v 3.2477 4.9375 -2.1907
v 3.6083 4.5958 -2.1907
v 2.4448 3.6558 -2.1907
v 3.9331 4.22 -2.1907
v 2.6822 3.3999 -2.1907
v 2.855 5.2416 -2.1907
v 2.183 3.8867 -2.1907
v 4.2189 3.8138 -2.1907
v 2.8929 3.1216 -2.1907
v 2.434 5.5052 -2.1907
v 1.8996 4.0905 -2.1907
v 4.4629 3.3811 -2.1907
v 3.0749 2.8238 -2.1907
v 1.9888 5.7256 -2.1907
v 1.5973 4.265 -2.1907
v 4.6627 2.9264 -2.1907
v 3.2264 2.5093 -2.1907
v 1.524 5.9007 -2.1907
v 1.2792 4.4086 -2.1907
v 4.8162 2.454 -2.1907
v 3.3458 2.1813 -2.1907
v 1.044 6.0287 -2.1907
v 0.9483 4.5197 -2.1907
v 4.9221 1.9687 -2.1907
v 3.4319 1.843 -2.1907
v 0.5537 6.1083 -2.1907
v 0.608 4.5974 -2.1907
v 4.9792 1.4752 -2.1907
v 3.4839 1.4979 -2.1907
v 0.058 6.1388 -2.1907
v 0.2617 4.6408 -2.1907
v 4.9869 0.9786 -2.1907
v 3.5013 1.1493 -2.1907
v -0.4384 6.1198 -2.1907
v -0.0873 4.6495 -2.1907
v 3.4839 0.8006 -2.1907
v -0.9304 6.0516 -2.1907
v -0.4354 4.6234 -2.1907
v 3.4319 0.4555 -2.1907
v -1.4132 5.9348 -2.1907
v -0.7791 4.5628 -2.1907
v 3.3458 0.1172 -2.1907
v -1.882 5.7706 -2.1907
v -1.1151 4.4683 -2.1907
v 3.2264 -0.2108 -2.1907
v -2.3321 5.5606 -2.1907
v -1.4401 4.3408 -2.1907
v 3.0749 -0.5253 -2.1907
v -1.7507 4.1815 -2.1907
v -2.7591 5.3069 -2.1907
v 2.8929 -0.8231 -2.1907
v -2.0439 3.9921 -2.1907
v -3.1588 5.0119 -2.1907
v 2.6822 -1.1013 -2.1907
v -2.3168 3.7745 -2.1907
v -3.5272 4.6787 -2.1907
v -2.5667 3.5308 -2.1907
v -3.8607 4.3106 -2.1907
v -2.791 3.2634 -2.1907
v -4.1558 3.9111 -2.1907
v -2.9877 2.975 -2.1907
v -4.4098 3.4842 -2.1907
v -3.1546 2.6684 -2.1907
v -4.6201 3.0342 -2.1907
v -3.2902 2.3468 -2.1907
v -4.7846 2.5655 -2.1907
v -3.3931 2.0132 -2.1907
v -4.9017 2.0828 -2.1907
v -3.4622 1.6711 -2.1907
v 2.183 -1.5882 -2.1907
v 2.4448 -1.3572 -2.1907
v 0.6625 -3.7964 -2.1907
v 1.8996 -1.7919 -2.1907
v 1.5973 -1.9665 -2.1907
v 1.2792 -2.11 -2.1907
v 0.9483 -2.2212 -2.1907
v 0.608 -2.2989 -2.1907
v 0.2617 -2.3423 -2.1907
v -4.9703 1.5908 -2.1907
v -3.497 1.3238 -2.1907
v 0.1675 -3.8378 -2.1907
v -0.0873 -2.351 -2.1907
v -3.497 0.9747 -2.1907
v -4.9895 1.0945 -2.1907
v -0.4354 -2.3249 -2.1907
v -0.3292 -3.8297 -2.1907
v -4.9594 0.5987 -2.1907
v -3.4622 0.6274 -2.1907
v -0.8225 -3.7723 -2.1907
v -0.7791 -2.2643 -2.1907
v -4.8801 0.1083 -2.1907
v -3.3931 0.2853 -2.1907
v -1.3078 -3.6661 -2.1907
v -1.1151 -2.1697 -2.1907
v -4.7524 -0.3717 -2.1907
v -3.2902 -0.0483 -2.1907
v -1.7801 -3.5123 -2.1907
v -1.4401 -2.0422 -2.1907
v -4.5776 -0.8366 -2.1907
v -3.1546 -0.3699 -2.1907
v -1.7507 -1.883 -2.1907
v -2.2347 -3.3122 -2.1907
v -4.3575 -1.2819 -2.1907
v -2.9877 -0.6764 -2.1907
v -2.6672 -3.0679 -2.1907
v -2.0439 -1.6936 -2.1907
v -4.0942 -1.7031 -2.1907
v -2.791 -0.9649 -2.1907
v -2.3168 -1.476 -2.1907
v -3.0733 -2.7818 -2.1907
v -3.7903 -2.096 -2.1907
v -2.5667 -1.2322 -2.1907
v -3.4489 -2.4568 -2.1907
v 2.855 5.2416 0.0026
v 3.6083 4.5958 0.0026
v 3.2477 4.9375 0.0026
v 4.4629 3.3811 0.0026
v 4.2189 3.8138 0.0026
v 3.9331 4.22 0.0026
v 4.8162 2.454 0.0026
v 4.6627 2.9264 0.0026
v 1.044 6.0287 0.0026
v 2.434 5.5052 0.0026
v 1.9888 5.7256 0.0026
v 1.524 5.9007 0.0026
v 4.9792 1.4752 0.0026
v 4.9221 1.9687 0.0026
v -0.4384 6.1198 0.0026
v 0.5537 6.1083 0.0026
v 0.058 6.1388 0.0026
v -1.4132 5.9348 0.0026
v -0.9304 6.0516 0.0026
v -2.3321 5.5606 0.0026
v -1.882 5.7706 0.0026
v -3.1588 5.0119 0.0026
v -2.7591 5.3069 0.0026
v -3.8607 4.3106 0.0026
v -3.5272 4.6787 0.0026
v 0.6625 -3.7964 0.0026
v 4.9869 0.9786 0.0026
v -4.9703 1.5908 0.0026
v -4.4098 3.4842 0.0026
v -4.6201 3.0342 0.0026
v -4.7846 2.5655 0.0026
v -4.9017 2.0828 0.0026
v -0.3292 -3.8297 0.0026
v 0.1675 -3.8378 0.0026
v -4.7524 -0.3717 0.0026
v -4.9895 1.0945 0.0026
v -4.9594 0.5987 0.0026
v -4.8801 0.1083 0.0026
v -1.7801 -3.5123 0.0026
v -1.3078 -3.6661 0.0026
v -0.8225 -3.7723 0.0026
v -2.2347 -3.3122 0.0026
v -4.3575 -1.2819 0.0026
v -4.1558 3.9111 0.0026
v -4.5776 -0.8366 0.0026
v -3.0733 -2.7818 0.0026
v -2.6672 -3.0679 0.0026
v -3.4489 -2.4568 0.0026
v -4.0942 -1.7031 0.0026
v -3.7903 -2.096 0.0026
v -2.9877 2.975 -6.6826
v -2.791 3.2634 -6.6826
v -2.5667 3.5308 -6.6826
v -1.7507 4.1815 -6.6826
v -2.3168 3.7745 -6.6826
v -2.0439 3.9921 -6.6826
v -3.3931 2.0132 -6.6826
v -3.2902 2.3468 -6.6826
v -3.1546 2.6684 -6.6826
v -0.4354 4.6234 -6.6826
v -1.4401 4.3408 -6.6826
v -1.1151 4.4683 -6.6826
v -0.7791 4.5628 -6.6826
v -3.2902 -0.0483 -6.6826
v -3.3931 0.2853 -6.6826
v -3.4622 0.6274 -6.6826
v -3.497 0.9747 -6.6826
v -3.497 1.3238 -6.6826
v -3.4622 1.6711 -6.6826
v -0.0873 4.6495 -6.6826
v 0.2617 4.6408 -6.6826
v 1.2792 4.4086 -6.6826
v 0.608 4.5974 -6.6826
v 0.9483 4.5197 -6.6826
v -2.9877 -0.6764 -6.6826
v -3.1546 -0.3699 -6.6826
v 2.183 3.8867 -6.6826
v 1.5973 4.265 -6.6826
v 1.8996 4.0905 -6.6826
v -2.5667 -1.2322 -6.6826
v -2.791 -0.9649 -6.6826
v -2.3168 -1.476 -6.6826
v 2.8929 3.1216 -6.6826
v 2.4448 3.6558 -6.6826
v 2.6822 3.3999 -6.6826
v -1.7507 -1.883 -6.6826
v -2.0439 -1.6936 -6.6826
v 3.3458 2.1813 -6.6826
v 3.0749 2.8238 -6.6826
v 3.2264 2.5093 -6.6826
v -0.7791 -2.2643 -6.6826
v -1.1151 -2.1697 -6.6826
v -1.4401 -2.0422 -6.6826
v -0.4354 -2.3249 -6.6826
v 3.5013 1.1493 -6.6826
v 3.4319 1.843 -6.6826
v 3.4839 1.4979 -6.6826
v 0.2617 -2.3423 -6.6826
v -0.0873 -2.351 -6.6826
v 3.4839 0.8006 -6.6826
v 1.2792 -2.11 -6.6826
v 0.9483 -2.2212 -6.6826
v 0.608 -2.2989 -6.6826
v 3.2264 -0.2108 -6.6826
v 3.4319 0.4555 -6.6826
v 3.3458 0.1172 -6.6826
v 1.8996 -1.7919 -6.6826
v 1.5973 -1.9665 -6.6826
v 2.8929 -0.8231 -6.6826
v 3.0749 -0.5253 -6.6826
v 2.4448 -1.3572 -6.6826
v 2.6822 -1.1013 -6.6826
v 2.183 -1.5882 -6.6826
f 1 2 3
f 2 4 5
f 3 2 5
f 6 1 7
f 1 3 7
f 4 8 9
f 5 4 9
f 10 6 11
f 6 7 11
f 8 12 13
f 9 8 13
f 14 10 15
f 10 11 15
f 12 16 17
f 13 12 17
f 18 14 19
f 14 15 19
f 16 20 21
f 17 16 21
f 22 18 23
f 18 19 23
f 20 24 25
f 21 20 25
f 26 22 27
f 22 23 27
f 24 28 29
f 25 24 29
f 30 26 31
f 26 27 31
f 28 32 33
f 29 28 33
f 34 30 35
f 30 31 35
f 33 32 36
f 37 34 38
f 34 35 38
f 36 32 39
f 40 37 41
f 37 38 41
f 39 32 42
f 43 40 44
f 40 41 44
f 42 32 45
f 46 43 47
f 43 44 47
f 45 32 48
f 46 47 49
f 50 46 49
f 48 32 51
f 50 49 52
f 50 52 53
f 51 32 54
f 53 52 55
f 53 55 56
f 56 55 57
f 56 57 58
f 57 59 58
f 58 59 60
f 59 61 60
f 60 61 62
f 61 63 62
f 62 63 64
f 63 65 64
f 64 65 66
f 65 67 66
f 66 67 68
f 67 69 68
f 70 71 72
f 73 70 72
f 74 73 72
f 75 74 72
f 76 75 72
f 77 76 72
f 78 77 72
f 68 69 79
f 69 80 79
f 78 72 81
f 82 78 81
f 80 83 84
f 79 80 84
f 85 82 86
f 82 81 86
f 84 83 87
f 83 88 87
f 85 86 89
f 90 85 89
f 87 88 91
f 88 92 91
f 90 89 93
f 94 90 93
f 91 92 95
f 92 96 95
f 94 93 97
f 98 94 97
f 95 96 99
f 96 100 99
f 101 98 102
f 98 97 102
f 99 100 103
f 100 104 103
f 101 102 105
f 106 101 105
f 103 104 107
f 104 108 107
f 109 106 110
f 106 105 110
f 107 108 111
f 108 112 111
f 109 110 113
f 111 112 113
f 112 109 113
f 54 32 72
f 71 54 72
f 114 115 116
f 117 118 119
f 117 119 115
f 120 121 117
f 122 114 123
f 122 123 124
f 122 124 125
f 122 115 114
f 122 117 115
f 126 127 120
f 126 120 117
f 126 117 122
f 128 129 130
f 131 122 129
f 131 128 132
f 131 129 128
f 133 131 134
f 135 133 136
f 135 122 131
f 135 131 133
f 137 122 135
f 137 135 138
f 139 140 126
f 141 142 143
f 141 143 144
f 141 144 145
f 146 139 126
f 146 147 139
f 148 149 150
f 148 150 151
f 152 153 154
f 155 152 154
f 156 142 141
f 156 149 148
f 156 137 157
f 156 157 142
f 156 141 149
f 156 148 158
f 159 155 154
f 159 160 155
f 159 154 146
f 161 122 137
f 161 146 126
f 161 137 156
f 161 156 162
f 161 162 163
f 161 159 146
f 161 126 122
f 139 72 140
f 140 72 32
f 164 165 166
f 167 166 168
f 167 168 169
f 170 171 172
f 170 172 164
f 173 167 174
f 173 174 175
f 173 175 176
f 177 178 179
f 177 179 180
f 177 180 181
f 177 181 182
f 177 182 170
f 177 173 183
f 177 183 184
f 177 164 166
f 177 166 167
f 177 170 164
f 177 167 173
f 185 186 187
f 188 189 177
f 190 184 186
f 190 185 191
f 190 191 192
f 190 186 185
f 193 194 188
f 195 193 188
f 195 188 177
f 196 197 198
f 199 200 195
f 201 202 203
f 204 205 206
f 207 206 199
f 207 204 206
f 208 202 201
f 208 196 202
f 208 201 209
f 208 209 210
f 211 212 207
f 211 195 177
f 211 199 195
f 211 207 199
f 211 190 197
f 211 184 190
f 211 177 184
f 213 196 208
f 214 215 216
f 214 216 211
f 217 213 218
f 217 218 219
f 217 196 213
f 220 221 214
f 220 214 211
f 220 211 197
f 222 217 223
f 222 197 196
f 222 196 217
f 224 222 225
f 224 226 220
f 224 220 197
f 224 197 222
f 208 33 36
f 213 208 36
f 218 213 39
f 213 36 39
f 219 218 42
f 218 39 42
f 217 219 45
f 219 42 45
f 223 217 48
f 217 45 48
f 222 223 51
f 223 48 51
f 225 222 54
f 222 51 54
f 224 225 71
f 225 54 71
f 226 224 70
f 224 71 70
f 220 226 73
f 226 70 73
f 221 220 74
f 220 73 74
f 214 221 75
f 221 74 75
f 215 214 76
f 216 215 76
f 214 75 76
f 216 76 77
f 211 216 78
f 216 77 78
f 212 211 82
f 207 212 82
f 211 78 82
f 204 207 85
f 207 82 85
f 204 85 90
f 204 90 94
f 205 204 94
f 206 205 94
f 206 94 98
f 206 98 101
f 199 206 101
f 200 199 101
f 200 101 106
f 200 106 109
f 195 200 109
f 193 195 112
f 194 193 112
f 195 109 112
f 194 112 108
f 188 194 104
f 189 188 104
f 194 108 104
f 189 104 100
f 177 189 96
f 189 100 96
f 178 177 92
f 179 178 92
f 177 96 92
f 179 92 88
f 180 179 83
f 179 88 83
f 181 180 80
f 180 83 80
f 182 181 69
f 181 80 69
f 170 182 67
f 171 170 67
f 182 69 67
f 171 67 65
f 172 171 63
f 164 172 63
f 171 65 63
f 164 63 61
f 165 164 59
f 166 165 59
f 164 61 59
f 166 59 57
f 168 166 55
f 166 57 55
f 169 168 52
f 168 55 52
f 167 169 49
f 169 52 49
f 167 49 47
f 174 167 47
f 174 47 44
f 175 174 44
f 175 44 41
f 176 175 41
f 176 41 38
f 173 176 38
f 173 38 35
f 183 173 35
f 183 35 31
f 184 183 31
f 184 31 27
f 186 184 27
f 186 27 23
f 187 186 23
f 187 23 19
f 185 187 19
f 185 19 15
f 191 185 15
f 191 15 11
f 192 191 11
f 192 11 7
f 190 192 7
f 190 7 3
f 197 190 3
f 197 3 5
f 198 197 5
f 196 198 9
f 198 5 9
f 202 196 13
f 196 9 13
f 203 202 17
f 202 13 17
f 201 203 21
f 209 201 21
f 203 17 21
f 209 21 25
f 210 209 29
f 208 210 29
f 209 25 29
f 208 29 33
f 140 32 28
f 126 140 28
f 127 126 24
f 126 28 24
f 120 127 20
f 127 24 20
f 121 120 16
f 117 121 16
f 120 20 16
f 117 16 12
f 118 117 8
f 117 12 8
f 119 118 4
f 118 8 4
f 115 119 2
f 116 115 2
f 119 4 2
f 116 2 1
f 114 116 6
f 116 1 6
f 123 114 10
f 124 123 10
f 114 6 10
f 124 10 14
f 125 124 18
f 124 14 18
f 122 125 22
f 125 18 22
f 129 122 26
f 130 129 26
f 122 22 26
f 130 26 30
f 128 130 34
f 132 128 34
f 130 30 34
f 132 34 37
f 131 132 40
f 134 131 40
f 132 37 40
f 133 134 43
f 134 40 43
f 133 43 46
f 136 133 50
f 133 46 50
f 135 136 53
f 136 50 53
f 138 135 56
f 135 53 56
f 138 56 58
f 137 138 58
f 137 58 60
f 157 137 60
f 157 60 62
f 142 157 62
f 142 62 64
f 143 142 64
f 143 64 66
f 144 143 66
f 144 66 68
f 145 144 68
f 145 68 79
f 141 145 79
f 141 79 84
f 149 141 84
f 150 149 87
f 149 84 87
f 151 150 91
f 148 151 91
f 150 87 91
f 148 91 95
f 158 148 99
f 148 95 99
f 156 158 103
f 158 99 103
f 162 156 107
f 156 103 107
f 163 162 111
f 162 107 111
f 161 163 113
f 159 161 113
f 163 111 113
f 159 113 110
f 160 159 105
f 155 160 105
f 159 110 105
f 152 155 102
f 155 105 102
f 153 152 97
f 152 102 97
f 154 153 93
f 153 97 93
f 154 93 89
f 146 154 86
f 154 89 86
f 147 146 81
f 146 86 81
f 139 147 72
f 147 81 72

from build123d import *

# Parameters (mm, degrees)
SKETCH_2_R        = 3.501329815
EXTRUDE_1_DEPTH   = 4.491890815
EXTRUDE_2_DEPTH   = 2.193354394
MOVE_BODY_1_ANGLE = 90


with BuildPart() as part:
    # Эскиз2 → Бобышка-Вытянуть1 (new body)
    with BuildSketch(Plane(origin=(0, 0, 0), x_dir=(1, 0, 0), z_dir=(0, 1, 0))):
        Circle(SKETCH_2_R)
    extrude(amount=EXTRUDE_1_DEPTH)

    # Эскиз3 → Бобышка-Вытянуть2 (add)
    with BuildSketch(Plane(origin=(0, 0, 0), x_dir=(-1, 0, 0), z_dir=(0, -1, 0))):
        with BuildLine():
            Line((-0.662486279, 4.945665231), (-4.986919029, 0.170678767))
            ThreePointArc((-4.986919029, 0.170678767), (3.698522545, -3.349540809), (-0.662486279, 4.945665231))
        make_face()
    extrude(amount=EXTRUDE_2_DEPTH)


with BuildPart() as part_1:
    # Move Body 1: moved
    add(part.part.rotate(Axis((0, 1.149268211, 0), (-1, 0, 0)), MOVE_BODY_1_ANGLE))


with BuildPart() as part_2:
    # Move Body 2: moved
    add(part_1.part.moved(Location((0, 0, -3.34))))


solid = part_2.part
